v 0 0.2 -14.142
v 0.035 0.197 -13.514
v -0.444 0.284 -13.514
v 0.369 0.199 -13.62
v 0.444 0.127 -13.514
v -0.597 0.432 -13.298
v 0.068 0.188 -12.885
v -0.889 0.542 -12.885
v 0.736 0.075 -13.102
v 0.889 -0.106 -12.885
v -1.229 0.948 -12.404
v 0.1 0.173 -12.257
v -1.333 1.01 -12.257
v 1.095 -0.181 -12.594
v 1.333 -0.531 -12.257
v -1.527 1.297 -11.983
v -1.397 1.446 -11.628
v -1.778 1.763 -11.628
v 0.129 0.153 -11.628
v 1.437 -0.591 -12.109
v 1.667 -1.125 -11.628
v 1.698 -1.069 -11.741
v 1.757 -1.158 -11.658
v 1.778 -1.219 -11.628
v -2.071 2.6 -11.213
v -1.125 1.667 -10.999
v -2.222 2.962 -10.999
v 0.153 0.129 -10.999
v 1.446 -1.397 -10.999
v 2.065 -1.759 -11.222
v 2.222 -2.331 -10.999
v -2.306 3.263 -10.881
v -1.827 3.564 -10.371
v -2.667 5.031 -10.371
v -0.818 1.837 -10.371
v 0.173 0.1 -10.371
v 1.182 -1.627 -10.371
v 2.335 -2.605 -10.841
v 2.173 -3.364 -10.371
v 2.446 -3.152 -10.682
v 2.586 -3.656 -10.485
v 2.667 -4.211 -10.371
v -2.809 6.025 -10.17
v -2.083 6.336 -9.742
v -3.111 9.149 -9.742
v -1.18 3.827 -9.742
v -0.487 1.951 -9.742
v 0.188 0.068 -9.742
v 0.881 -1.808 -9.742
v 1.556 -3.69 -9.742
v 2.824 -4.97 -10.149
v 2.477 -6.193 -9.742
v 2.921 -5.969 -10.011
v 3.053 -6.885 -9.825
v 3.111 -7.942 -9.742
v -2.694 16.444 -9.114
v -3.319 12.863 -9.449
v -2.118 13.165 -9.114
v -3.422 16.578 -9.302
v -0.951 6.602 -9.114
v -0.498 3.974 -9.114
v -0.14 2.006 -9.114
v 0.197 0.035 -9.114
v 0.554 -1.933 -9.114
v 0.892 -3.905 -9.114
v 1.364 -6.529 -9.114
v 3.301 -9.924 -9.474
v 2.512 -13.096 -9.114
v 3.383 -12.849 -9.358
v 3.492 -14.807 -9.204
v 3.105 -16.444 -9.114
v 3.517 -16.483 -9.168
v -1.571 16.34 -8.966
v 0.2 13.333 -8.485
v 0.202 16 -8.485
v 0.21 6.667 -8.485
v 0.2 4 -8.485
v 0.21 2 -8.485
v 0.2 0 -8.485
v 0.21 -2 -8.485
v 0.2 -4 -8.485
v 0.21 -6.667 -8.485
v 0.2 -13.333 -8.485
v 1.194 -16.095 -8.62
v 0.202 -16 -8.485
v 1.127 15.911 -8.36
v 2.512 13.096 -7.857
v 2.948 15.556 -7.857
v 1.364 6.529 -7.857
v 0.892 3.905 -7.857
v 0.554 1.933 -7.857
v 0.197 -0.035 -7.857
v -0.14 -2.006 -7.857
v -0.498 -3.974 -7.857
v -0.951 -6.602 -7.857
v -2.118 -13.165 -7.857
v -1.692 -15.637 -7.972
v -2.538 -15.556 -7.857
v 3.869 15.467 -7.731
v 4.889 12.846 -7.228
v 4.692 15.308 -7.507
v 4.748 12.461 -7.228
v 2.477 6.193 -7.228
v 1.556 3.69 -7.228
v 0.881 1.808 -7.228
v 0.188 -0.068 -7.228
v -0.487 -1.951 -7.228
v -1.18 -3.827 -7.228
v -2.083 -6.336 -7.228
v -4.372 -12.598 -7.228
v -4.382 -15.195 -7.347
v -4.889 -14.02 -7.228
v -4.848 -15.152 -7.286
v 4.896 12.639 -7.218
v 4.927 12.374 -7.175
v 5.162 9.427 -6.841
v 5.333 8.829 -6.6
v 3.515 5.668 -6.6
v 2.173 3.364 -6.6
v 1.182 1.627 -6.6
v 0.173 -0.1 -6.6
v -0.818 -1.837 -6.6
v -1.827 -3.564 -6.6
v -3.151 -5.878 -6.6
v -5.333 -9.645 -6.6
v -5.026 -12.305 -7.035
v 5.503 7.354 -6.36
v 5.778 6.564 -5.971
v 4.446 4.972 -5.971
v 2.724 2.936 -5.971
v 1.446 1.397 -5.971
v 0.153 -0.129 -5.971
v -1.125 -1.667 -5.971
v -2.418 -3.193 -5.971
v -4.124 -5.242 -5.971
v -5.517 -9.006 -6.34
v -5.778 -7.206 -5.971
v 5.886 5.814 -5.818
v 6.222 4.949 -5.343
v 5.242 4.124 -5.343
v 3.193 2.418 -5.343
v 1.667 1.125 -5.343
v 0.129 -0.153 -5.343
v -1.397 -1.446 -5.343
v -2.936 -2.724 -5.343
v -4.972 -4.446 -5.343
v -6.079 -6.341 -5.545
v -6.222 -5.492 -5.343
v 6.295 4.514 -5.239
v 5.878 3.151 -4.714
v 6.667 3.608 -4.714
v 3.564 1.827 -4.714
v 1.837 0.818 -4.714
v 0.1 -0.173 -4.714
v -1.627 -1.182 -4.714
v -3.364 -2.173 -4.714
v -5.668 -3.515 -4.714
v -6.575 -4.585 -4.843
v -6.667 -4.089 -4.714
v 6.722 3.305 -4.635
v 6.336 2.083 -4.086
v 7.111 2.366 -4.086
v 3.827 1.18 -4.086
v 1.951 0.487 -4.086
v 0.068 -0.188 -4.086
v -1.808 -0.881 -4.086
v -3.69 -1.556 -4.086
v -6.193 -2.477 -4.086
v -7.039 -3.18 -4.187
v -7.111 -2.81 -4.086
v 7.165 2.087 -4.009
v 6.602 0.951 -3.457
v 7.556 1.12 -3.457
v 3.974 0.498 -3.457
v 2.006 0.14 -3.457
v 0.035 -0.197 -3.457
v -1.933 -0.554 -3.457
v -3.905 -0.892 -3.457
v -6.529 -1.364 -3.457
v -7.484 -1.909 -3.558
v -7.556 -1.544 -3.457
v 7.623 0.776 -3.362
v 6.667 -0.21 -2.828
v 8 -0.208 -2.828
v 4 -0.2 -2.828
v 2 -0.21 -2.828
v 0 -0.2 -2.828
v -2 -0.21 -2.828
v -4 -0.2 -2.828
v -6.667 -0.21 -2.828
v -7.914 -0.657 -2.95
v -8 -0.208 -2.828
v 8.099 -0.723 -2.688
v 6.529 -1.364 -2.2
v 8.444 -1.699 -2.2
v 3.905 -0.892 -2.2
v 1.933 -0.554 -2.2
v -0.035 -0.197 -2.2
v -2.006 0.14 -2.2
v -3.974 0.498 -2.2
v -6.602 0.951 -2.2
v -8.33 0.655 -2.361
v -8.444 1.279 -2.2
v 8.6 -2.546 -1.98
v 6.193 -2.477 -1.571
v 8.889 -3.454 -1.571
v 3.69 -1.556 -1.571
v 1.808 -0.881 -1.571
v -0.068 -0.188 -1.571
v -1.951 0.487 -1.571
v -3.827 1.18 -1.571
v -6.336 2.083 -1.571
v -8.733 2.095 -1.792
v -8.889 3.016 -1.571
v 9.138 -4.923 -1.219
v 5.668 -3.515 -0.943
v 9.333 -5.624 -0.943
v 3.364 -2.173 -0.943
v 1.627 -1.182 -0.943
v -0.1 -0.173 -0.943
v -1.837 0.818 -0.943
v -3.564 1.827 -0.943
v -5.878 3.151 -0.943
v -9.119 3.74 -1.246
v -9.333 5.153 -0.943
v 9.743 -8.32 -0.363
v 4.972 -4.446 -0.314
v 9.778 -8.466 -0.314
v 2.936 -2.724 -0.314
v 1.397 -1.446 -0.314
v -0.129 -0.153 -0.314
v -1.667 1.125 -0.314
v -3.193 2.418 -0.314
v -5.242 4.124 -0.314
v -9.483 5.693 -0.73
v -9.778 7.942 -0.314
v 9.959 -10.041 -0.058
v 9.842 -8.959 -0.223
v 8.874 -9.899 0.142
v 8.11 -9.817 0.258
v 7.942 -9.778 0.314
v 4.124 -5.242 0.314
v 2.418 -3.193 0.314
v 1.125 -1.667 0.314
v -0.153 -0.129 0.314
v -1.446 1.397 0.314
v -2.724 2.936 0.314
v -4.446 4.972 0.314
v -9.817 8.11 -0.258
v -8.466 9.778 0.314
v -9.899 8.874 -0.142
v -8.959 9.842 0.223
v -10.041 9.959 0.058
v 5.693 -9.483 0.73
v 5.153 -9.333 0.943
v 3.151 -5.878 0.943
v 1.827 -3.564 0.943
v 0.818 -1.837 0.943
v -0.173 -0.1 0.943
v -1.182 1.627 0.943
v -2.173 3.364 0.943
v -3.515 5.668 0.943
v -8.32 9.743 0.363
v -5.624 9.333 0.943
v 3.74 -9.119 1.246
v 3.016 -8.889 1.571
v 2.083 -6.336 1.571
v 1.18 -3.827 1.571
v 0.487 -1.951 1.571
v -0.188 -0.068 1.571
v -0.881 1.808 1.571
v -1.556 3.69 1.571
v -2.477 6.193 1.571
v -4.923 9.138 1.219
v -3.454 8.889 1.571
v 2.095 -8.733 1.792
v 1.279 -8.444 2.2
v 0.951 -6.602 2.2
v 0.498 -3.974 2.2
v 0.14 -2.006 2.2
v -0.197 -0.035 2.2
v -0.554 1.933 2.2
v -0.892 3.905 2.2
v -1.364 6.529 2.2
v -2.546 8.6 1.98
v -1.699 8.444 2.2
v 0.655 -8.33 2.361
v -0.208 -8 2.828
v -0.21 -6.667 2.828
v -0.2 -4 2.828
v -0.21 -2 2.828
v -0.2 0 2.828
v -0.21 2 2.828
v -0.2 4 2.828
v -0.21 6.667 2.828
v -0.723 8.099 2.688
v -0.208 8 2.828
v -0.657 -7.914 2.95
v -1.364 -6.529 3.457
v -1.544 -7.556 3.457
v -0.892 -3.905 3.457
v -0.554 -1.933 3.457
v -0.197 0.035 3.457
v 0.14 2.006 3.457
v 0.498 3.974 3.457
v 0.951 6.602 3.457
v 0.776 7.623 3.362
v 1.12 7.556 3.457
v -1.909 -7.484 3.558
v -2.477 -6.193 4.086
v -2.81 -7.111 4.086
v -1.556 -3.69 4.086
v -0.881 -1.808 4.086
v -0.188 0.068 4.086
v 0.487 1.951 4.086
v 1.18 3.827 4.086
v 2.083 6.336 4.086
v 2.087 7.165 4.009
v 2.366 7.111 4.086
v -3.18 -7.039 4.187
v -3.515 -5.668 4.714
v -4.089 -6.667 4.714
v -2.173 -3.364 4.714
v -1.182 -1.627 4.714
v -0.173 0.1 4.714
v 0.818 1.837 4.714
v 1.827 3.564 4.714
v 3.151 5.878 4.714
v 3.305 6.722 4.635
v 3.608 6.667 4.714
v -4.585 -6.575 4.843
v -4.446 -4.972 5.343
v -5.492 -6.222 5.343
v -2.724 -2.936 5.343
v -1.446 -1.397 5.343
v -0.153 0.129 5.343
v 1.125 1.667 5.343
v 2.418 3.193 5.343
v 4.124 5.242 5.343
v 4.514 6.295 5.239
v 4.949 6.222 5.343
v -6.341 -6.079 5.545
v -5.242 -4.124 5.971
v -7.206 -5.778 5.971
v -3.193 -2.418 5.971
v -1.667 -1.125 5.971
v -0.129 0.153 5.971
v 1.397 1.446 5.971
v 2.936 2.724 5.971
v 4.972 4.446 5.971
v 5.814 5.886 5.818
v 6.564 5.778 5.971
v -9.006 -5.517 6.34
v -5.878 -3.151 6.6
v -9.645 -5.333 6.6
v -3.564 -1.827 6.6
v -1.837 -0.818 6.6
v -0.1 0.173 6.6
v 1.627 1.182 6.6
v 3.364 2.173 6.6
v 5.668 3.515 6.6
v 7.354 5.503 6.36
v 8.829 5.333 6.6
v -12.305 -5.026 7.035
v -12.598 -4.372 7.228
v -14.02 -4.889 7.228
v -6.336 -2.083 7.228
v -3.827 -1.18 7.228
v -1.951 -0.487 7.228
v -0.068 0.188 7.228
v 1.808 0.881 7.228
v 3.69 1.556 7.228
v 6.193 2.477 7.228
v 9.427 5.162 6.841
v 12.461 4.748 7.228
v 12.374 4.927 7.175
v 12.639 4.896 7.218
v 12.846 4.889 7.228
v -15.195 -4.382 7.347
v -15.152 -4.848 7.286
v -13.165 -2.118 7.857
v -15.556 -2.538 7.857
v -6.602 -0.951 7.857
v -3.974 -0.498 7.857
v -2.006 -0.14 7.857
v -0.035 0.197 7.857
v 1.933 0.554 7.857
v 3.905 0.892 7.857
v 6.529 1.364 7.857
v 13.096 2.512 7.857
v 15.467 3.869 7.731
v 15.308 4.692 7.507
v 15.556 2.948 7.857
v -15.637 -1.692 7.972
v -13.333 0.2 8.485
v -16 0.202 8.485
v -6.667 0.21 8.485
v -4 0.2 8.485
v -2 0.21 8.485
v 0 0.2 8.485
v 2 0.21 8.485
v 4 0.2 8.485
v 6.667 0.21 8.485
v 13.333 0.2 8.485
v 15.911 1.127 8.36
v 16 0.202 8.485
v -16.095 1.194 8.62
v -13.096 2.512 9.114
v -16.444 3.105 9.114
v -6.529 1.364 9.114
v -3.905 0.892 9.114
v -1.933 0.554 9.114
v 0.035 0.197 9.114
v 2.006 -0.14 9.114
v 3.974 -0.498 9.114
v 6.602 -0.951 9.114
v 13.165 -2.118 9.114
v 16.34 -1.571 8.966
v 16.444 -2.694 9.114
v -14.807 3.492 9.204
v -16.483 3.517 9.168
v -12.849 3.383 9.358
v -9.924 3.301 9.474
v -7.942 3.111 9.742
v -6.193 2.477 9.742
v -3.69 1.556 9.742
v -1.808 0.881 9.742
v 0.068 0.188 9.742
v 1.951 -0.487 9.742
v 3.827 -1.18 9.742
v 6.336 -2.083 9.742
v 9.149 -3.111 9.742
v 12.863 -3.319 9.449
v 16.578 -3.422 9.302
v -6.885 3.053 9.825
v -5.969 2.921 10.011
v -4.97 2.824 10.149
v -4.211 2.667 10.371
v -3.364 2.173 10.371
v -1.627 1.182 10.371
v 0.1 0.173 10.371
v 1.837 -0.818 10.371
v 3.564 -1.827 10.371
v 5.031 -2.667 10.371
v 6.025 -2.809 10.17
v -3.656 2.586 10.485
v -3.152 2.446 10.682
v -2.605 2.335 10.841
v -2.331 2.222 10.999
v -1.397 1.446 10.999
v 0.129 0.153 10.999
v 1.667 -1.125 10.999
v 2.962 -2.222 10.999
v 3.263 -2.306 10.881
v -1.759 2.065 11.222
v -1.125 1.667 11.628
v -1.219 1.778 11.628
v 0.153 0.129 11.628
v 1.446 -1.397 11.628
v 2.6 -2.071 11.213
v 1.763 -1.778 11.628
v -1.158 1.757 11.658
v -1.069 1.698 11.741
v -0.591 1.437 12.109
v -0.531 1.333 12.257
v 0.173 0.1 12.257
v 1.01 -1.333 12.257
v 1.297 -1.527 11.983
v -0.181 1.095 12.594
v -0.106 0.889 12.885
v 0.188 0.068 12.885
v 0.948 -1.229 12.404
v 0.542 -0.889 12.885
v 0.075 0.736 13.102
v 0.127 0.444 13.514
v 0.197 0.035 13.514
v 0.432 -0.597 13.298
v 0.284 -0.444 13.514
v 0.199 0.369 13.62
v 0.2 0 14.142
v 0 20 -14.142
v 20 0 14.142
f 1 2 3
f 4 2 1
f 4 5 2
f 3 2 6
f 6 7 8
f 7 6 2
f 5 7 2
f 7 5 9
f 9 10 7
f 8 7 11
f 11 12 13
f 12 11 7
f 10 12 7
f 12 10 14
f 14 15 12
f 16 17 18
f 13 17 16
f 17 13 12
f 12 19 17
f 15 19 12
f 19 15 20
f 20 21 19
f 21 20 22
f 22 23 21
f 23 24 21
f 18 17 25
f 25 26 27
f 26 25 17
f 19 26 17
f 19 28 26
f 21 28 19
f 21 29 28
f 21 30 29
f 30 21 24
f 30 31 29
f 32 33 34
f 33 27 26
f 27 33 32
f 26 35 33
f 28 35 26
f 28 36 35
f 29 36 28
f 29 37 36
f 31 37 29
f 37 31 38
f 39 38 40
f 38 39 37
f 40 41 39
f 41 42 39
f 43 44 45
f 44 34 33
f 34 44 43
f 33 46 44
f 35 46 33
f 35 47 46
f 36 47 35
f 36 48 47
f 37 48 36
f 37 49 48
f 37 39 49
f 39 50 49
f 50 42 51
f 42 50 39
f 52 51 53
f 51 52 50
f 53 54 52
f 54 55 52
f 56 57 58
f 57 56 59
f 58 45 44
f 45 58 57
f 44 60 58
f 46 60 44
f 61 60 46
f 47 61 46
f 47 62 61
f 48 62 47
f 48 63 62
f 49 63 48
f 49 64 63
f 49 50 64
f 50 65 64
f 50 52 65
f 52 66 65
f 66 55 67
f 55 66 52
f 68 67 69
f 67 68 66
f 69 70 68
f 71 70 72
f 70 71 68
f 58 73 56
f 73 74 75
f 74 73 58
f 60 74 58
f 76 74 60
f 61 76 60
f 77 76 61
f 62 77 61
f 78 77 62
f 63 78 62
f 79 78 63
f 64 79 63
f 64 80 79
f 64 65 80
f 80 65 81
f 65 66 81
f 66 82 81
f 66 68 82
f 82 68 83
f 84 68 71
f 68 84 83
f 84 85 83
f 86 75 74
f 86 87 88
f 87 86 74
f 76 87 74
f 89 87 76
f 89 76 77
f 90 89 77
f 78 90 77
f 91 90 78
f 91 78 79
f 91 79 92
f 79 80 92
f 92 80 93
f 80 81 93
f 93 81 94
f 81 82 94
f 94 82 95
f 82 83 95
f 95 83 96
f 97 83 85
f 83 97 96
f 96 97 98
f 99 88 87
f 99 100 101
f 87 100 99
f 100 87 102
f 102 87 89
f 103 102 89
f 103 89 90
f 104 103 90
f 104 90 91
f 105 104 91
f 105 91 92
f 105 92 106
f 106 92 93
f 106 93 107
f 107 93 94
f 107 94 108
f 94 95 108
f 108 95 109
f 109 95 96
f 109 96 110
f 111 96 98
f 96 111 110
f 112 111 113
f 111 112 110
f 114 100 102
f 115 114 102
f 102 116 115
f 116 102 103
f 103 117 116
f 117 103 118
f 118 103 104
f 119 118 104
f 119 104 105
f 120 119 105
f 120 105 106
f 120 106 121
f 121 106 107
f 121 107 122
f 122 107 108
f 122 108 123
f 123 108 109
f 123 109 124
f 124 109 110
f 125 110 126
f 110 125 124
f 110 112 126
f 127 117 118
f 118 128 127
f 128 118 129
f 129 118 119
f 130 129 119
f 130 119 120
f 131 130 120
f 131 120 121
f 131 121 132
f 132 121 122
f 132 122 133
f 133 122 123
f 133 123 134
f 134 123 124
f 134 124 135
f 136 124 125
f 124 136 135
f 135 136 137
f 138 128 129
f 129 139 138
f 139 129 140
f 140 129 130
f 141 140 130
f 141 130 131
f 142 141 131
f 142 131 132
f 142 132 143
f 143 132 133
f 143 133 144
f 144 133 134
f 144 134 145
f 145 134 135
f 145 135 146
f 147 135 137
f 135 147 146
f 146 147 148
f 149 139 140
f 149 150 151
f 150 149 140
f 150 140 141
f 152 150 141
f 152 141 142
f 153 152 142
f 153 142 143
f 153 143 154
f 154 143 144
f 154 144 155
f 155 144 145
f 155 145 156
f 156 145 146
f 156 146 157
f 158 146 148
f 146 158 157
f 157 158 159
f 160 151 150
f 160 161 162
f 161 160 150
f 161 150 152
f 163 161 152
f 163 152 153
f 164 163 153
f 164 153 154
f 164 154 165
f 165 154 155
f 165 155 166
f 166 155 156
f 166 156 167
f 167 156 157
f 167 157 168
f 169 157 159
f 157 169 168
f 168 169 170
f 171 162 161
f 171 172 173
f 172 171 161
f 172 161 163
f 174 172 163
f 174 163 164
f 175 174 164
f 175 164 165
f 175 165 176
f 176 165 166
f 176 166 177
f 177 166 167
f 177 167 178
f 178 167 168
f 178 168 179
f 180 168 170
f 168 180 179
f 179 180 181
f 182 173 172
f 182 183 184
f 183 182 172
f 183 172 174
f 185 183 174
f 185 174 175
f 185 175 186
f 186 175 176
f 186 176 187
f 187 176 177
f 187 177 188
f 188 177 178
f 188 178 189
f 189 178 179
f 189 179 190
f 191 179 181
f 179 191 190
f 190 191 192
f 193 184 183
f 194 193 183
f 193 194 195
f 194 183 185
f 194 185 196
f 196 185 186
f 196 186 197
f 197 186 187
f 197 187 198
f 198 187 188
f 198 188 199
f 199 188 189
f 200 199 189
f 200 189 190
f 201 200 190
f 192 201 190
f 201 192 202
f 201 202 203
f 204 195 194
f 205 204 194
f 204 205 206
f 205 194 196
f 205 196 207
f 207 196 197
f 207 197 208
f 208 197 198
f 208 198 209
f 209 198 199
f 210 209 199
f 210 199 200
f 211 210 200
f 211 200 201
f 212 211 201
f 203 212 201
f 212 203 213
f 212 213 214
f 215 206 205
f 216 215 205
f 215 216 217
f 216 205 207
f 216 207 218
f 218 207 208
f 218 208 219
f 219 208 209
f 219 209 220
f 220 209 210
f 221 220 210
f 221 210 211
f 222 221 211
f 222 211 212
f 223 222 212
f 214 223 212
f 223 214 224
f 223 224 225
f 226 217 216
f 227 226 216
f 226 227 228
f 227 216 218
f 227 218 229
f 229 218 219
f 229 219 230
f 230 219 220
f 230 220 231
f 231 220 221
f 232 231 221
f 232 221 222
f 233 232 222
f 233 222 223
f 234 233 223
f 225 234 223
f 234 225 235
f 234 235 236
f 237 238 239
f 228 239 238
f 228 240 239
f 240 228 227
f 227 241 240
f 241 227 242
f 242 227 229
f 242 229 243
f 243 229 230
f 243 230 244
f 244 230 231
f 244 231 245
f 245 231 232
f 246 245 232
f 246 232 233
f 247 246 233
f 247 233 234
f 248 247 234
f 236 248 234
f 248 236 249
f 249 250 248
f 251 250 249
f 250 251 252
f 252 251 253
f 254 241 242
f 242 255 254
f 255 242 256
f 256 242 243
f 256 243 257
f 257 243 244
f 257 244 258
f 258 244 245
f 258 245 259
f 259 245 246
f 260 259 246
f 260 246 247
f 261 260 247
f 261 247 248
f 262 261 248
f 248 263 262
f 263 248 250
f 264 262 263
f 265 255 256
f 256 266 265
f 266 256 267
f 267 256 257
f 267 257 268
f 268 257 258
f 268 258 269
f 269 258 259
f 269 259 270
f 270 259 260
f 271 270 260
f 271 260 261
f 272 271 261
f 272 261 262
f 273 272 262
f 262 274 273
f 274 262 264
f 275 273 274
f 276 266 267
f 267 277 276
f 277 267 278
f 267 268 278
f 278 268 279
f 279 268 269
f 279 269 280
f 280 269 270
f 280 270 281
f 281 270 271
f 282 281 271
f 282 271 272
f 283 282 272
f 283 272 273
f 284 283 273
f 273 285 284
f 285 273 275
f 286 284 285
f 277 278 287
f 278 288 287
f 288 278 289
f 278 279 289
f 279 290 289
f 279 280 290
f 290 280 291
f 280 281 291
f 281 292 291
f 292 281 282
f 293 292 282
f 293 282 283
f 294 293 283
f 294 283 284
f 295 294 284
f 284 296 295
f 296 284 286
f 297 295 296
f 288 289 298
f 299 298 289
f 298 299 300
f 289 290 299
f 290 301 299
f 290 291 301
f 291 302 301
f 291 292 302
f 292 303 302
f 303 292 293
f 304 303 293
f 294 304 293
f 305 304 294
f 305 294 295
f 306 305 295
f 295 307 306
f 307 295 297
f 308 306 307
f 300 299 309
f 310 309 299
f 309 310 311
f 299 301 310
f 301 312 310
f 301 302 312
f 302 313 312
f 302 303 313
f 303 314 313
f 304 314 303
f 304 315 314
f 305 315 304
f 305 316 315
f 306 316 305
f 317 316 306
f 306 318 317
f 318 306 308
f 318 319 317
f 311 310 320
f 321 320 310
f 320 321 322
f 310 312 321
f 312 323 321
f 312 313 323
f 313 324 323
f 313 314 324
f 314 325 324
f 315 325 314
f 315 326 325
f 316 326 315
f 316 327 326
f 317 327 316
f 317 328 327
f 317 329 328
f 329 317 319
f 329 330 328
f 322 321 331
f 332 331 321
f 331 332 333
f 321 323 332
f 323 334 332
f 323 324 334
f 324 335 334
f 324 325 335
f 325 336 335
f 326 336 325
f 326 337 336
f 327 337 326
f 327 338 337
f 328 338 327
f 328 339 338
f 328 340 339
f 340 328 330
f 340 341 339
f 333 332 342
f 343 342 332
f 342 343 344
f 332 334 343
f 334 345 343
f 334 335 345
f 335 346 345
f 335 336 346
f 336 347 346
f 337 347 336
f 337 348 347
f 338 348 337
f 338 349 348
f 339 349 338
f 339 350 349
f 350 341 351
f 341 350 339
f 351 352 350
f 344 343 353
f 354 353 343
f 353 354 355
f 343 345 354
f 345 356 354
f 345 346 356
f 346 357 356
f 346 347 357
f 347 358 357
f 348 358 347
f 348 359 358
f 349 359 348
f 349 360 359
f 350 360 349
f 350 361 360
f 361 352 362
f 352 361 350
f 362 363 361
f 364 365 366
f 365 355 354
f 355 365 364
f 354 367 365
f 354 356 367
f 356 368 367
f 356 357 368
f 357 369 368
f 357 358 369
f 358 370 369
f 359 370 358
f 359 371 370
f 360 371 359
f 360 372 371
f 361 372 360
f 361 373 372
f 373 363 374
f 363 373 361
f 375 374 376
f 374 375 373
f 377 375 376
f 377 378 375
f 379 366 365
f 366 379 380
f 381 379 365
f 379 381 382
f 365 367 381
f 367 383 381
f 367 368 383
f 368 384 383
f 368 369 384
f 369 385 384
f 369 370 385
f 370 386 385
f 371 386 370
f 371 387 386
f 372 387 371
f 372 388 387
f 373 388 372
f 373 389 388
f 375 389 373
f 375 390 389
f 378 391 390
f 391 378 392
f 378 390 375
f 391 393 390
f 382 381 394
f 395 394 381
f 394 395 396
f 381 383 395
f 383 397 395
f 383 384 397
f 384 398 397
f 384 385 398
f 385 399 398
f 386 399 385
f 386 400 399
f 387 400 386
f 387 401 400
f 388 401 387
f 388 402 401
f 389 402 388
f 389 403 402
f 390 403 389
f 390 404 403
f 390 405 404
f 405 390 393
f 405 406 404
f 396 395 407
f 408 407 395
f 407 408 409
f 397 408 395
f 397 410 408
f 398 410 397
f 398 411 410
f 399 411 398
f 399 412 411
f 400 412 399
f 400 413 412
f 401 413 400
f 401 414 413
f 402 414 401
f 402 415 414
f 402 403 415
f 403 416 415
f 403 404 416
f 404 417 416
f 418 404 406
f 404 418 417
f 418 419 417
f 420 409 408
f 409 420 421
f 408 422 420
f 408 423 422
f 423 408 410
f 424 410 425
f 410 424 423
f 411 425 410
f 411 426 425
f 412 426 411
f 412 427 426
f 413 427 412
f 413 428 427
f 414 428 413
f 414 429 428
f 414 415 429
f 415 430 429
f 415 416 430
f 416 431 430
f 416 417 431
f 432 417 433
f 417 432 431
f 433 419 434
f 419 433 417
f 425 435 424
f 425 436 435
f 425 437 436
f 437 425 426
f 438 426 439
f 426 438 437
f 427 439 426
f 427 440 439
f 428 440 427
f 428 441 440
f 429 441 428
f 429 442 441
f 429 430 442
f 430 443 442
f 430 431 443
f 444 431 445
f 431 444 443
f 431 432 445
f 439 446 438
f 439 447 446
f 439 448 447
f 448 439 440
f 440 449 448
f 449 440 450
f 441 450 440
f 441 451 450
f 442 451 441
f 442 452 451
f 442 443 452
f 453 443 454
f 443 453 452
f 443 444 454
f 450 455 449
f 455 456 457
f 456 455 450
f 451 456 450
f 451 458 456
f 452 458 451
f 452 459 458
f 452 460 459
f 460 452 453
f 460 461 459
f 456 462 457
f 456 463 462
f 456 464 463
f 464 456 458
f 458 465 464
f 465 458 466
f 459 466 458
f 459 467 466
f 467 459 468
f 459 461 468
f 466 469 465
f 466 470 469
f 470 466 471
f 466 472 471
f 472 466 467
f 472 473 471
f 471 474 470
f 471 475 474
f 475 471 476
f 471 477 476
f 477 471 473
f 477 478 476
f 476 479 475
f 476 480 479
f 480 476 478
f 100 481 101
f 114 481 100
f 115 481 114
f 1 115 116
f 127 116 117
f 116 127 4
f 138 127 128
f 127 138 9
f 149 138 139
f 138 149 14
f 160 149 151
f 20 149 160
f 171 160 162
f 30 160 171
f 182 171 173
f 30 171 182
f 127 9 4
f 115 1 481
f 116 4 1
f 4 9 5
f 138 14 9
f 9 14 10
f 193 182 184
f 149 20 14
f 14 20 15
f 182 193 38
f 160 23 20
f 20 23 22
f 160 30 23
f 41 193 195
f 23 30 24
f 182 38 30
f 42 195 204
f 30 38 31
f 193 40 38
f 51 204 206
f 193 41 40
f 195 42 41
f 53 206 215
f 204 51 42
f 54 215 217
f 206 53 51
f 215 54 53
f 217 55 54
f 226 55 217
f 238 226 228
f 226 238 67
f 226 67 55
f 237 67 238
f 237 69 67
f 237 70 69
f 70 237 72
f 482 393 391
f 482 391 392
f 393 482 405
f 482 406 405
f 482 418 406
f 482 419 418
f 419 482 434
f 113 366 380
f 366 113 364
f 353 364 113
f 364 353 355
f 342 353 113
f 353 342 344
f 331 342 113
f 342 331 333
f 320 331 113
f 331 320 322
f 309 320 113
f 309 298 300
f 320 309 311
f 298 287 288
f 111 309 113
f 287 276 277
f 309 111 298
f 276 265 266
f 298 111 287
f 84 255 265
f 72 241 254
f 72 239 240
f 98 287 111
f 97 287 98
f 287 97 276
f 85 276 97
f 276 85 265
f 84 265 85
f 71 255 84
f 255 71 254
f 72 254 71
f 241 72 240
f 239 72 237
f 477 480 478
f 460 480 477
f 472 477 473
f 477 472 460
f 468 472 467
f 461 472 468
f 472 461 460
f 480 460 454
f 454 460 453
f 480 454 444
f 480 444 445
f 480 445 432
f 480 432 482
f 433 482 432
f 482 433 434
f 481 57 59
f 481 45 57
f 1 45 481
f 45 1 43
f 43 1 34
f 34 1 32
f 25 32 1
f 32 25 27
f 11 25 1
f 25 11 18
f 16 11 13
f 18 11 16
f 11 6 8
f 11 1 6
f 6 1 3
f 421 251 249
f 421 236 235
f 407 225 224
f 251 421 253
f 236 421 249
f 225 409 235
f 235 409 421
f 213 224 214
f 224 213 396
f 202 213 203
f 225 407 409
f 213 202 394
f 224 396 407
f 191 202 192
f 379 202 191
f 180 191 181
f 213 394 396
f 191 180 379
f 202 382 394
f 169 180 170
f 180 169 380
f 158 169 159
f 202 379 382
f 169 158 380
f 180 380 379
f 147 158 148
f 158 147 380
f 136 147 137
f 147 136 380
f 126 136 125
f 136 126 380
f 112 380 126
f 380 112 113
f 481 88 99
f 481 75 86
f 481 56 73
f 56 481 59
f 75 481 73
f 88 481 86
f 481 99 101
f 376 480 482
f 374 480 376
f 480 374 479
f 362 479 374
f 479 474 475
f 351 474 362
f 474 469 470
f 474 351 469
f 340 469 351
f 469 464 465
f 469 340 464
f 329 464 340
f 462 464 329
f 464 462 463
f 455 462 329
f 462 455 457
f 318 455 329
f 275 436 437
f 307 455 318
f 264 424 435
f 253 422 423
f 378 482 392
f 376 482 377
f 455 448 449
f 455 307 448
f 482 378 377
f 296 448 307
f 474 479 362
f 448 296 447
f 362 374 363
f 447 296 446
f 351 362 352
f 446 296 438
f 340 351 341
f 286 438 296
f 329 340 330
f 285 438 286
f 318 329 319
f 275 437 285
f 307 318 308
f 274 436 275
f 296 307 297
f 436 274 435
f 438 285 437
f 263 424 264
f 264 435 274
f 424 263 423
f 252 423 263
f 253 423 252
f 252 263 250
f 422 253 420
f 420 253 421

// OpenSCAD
// file: HelixMod.scad
module half_cylinder_helix (
    height, twist, slices, radius, nb,
    jeu = 0.1,
    zz=0.01)
{
    steps = [-3/2, -1, -2/3, -1/3, -1/6, -1/10, -1/20, 0,
    	     1/20, 1/10, 1/6, 1/3, 2/3, 1, 3/2];
    shape = concat([for (i = [0:1:len(steps)-1])
			     [steps[i]*radius, jeu + zz * ((i % 2 == 0) ? 1 : 0)]],
		   [[3/2*radius, 3/2*radius+jeu],[-3/2*radius, 3/2*radius+jeu]]);

    intersection() {
	 linear_extrude(height=height, twist=twist, slices=slices, convexity=6) {
	      polygon(points=shape);
	 }
	 cylinder(h = height, r = radius, $fn=nb);
    }
}

half_cylinder_helix (40, 360, 20, radius=40, nb = 16, jeu=0.1);

module quarter_cylinder_helix (
    height, twist, slices, radius, nb,
    jeu = 0.1,
    zz=0.01)
{
     intersection() {
	  half_cylinder_helix(height, twist, slices, radius, nb, jeu, zz);
	  rotate([0,0,-90])
	  half_cylinder_helix(height, twist, slices, radius, nb, jeu, zz);
     }
};

color([1,0,0]) translate([0,0,-40])
quarter_cylinder_helix (40, 360, 20, radius=40, nb = 16, jeu=0.1);
// main file
use <HelixMod.scad>;

jeu = 0.2;
steps = 10;

intersection()
{ 
  polyhedron ( points = [[0, 20, -20*sqrt(2)/2],
                         [0, -20,-20*sqrt(2)/2],
                         [20, 0,  20*sqrt(2)/2],
                         [-20, 0, 20*sqrt(2)/2],
                         ],
                 faces = [[0,1,2],
                          [0,3,1],
                          [0,2,3],
                          [1,3,2]]
             );
  translate([0, 0, -20*sqrt(2)/2]) {
       half_cylinder_helix (height=20*sqrt(2),
			    twist=360+90,
			    slices=(360+90)/steps,
			    radius=40, nb = 6, jeu=jeu);
       }
}
